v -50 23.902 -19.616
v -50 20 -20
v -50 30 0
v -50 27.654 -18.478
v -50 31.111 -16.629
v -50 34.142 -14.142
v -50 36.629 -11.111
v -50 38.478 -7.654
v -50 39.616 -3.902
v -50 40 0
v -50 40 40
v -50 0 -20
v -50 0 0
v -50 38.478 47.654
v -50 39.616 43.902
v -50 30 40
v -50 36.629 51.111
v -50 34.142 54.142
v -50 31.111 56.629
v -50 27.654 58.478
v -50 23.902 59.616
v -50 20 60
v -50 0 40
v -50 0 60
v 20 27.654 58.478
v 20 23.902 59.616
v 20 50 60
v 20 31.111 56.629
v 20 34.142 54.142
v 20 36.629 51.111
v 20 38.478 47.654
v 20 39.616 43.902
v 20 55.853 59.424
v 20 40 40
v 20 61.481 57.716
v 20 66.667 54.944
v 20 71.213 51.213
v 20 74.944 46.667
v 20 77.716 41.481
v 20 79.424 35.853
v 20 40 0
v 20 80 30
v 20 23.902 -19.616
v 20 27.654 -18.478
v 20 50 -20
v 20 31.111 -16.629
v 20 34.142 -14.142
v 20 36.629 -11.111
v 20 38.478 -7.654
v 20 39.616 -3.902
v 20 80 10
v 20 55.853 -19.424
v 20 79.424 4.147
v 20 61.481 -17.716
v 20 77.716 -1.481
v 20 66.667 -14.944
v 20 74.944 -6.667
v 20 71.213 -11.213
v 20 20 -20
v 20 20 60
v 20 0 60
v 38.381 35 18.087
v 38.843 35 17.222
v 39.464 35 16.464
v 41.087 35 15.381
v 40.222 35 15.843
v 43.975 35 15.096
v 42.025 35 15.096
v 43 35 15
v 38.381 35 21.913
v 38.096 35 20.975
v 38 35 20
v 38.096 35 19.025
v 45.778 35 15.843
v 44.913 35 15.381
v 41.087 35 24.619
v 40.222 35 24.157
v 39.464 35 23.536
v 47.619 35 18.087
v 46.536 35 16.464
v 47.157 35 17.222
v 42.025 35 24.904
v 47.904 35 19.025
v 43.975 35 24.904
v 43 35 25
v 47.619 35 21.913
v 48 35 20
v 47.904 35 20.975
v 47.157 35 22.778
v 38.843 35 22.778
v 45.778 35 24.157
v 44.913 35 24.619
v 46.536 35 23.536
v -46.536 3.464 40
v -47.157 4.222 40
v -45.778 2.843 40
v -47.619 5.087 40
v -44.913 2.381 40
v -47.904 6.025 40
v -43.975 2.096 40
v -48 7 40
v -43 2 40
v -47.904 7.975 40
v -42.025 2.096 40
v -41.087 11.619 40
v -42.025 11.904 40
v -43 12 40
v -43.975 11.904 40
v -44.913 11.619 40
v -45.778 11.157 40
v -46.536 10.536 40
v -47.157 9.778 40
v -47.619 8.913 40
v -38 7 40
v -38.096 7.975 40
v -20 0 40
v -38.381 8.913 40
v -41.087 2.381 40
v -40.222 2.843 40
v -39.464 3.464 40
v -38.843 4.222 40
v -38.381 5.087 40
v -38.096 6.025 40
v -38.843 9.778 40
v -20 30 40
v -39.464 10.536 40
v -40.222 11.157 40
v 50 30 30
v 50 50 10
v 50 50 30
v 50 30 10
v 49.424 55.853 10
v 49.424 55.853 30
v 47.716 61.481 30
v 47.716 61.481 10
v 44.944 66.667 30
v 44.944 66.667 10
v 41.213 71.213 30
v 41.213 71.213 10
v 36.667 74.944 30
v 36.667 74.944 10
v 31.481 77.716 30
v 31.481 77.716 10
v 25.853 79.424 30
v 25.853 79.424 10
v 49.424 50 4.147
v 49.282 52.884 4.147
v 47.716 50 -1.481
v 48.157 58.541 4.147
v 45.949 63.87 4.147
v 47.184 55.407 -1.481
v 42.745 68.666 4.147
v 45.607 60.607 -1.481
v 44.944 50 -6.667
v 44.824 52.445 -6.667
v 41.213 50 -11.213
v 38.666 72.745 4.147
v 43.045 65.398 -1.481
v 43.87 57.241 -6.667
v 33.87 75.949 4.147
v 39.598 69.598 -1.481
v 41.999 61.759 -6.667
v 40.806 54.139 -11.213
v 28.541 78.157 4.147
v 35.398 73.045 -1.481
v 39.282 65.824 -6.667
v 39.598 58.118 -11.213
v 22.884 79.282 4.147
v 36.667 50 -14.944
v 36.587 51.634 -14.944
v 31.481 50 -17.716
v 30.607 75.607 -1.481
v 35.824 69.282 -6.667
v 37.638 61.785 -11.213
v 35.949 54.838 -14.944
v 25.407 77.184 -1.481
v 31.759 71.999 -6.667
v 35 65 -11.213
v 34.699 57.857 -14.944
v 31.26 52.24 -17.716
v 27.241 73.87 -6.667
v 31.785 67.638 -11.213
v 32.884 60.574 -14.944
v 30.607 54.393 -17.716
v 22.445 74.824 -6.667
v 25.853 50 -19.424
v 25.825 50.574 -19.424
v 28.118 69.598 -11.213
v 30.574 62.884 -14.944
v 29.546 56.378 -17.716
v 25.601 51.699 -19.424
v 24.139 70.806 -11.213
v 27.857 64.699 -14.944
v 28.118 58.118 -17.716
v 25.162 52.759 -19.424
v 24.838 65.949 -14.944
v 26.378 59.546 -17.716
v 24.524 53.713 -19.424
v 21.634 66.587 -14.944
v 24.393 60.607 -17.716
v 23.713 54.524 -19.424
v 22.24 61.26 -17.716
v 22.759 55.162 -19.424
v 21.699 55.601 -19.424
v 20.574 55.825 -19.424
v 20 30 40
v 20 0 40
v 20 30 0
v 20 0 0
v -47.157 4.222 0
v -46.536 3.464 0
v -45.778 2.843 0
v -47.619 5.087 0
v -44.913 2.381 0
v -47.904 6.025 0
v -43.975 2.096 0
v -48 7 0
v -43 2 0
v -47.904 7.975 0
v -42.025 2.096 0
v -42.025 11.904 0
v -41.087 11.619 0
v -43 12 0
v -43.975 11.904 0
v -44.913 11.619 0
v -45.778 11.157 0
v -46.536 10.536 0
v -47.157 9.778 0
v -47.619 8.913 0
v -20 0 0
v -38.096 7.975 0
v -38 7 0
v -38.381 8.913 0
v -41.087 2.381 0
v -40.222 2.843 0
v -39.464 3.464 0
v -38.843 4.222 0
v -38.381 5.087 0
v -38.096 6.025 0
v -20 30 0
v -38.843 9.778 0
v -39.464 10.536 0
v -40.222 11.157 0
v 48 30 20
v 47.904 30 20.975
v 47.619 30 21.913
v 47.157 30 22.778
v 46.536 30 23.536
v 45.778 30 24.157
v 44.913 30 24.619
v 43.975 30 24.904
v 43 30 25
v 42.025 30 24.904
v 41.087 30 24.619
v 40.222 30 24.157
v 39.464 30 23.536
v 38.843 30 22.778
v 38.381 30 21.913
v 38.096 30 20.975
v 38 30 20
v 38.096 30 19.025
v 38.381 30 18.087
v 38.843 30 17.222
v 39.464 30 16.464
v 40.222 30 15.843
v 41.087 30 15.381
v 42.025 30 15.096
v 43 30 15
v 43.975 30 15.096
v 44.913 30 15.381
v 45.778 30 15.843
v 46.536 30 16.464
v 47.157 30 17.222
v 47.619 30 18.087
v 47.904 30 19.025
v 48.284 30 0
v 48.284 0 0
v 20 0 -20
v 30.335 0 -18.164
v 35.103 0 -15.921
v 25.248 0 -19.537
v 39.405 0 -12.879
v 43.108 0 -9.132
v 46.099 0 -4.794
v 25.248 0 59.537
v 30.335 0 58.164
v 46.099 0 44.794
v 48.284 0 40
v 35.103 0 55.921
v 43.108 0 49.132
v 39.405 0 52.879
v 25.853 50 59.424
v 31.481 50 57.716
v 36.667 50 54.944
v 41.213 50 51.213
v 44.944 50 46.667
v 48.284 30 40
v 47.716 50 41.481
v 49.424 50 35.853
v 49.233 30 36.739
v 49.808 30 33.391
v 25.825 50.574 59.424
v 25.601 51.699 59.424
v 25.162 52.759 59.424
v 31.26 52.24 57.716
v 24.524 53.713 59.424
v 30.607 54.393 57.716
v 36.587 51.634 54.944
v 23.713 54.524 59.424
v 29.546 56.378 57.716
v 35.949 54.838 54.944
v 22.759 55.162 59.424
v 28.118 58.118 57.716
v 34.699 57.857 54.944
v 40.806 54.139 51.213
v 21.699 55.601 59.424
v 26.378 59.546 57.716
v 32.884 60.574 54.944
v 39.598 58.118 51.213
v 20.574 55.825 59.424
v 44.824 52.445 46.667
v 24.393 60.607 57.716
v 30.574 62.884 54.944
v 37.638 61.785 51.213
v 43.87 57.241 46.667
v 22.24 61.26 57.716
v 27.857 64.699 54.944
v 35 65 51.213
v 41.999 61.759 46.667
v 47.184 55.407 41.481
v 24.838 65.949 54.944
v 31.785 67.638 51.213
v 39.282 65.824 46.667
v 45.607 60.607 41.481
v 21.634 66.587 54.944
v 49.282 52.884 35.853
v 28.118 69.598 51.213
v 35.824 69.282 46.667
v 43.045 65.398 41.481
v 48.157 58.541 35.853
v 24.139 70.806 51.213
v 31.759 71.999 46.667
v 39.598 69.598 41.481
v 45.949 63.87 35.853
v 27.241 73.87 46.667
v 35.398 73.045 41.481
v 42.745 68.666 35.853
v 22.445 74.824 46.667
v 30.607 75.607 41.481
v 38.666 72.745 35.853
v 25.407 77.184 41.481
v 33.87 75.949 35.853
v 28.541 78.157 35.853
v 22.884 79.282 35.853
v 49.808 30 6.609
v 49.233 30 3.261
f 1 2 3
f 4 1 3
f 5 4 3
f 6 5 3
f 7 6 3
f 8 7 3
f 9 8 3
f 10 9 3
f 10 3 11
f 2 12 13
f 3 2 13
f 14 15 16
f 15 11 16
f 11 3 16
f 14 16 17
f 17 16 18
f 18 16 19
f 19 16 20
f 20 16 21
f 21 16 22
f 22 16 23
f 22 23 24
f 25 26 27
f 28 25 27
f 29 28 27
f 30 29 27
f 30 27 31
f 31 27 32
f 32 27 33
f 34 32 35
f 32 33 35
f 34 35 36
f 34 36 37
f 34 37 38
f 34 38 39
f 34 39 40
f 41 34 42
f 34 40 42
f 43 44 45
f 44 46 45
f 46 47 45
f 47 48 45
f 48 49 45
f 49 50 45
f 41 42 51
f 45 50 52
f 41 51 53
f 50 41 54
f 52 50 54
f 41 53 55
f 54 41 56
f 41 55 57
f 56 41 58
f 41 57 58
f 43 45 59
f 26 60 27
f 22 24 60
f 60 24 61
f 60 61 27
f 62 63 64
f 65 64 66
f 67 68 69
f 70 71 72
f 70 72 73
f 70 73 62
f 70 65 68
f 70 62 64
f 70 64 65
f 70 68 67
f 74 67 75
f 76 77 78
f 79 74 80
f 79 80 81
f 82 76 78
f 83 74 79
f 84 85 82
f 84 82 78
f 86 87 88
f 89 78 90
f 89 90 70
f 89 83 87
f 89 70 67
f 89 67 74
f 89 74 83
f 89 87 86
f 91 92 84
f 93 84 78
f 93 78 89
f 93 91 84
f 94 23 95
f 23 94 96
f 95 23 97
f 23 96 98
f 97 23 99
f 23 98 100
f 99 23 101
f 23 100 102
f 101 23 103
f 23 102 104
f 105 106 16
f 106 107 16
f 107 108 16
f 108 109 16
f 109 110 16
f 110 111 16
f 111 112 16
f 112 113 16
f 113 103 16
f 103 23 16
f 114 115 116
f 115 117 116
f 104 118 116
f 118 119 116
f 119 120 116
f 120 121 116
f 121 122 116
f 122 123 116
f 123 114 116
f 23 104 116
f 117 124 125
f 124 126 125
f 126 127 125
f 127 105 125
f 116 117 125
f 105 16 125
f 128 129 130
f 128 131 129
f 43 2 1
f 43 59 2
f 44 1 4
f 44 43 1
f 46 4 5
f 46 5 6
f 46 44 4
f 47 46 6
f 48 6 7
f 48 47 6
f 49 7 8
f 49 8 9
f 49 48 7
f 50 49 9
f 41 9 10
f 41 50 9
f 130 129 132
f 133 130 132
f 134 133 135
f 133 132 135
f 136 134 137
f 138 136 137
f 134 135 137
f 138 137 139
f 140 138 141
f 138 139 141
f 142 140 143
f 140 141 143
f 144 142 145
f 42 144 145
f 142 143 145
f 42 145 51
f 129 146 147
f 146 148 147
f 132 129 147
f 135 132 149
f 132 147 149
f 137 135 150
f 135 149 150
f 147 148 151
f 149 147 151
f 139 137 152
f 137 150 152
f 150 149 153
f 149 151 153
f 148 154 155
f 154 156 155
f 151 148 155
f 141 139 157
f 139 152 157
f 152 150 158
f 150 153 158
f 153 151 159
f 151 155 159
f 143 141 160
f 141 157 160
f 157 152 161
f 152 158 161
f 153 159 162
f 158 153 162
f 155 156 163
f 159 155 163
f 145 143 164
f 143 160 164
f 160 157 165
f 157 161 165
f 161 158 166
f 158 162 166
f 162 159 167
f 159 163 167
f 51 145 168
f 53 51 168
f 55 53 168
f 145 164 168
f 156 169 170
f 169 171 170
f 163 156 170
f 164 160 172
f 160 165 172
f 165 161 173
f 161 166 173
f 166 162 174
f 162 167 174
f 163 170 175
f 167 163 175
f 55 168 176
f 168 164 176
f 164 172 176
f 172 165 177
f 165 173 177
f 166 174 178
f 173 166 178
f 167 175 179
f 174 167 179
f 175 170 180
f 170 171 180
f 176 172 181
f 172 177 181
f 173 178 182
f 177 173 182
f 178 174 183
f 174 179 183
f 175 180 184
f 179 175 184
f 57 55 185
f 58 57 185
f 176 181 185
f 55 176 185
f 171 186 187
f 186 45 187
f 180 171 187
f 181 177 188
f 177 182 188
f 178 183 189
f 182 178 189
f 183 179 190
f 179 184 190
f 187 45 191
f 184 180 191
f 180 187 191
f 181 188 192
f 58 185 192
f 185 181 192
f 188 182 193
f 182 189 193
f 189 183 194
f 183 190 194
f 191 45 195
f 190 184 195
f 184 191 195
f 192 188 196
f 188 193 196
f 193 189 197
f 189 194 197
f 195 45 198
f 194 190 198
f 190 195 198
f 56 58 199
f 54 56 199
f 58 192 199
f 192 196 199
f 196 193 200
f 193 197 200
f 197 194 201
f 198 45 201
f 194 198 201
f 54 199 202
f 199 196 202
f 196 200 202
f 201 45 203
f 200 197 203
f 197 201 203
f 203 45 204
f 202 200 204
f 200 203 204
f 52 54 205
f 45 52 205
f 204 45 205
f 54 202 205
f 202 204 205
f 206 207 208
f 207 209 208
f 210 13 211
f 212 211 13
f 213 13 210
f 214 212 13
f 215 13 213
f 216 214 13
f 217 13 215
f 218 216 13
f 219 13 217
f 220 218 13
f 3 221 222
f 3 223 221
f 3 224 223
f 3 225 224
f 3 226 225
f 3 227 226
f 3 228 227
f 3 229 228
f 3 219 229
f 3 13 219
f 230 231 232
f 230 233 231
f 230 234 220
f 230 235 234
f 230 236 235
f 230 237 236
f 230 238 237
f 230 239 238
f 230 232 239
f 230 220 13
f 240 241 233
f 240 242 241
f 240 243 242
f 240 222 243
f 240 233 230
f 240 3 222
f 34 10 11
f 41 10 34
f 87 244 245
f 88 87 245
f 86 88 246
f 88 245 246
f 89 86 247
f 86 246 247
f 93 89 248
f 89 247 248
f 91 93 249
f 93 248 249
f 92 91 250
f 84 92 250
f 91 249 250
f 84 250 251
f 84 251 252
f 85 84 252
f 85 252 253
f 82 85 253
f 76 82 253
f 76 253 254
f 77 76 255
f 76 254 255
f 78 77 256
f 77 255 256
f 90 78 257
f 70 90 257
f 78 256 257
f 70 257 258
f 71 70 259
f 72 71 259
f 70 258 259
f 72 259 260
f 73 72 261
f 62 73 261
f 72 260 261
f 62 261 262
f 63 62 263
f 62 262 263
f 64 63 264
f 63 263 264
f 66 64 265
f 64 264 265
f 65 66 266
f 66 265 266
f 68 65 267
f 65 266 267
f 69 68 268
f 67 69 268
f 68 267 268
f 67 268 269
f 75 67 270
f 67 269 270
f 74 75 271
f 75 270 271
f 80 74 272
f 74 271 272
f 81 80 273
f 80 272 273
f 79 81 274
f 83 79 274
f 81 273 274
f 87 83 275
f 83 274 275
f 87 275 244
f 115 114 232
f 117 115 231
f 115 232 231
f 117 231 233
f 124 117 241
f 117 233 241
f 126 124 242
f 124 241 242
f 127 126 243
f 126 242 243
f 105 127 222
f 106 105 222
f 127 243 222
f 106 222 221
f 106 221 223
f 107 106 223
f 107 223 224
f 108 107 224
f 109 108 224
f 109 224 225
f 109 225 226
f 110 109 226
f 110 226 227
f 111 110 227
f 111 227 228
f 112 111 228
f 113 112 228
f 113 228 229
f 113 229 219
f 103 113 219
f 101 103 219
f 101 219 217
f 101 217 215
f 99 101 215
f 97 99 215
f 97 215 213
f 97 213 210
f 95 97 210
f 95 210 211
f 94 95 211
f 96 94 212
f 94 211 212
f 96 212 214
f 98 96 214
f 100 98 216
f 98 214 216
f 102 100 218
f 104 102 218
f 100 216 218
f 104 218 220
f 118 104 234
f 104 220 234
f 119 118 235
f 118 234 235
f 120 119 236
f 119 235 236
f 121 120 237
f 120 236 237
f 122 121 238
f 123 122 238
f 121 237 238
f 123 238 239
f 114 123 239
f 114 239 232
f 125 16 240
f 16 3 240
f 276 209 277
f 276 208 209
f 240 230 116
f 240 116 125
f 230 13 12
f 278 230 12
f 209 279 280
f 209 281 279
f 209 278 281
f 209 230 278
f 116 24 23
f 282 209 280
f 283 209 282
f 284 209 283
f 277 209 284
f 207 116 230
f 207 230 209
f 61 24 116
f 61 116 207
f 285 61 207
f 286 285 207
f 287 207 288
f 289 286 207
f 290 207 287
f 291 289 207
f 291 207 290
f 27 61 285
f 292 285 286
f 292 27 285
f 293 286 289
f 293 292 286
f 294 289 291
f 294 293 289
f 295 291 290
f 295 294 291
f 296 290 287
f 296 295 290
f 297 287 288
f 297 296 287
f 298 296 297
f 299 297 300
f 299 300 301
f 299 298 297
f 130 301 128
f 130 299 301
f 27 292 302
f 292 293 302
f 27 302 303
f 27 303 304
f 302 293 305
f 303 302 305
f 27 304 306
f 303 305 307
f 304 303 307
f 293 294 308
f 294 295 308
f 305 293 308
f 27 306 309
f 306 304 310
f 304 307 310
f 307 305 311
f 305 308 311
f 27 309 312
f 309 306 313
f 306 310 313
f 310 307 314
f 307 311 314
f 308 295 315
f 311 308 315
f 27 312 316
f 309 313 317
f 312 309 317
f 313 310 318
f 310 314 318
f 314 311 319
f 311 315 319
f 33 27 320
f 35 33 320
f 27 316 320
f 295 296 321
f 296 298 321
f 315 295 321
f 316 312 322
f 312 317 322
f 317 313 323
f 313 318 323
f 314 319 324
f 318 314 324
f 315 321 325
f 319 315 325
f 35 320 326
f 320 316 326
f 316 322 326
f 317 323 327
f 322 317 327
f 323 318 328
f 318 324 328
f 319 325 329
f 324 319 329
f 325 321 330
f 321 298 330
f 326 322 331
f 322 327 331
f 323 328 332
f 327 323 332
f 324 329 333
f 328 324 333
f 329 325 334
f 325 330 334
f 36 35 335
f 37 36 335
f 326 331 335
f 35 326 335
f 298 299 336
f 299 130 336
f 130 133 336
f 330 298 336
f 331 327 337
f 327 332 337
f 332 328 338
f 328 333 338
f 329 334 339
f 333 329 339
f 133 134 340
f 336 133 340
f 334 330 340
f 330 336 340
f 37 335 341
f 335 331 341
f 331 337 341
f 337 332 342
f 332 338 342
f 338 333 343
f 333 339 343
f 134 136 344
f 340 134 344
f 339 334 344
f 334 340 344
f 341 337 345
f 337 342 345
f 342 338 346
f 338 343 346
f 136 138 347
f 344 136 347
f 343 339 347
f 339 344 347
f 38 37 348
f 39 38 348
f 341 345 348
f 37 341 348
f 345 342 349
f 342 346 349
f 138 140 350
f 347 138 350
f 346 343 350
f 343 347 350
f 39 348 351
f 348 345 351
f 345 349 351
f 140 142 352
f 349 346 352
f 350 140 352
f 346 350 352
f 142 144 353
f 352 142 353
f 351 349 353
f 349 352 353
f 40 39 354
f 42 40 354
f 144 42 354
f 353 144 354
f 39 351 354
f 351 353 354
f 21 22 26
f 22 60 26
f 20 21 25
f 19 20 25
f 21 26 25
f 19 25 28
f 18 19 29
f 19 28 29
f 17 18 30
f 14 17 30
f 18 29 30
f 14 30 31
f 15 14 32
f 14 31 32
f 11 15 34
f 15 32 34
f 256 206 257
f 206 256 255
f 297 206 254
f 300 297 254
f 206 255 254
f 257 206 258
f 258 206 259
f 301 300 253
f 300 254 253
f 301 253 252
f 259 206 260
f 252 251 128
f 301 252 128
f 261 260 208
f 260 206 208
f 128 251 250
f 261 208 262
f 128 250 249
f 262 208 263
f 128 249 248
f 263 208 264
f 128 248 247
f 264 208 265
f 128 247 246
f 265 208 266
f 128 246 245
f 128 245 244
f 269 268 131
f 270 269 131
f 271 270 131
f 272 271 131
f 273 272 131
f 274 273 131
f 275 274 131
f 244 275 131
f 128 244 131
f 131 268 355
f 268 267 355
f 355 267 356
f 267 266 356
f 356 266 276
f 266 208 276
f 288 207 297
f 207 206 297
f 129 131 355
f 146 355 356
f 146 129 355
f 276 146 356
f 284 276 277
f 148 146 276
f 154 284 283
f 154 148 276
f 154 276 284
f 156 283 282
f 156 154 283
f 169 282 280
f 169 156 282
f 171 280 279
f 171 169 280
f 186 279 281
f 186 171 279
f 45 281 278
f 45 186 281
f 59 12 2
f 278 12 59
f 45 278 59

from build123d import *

# Parameters (mm, degrees)
SKETCH_1_W          = 100
SKETCH_1_H          = 40
EXTRUDE_1_DEPTH     = 80
SKETCH_3_W          = 30
SKETCH_3_H          = 30
CUT_EXTRUDE_2_DEPTH = 20
SKETCH_6_R          = 5
EXTRUDE_2_DEPTH     = 20
SKETCH_7_W          = 70
SKETCH_7_H          = 80
CUT_EXTRUDE_3_DEPTH = 40
FILLET_1_R          = 30
FILLET_2_R          = 30
FILLET_3_R          = 30
FILLET_4_R          = 20
FILLET_5_R          = 20
SKETCH1_R           = 5
CUT_EXTRUDE1_DEPTH  = 5


with BuildPart() as part:
    # 草圖1 → 填料-伸長1 (new body)
    with BuildSketch(Plane(origin=(0, 0, 0), x_dir=(1, 0, 0), z_dir=(0, 1, 0))):
        Rectangle(SKETCH_1_W, SKETCH_1_H)
    extrude_1 = extrude(amount=EXTRUDE_1_DEPTH)

    # 草圖3 → 除料-伸長2 (cut)
    with BuildSketch(Plane.XY.offset(20)):
        with Locations((-35, 15)):
            Rectangle(SKETCH_3_W, SKETCH_3_H)
        with Locations((35, 15)):
            Rectangle(SKETCH_3_W, SKETCH_3_H)
    cut_extrude_2 = extrude(amount=-CUT_EXTRUDE_2_DEPTH, mode=Mode.SUBTRACT)

    # 草圖6 → 填料-伸長2 (add)
    with BuildSketch(Plane.XY):
        with Locations((-43, 7)):
            Circle(SKETCH_6_R)
    extrude_2 = extrude(amount=EXTRUDE_2_DEPTH)

    # 鏡射3: 填料-伸長1, 除料-伸長2, 填料-伸長2 across plane
    add(extrude_1.mirror(Plane(origin=(-50, 80, 20), x_dir=(1, 0, 0), z_dir=(0, 0, -1))))
    add(cut_extrude_2.mirror(Plane(origin=(-50, 80, 20), x_dir=(1, 0, 0), z_dir=(0, 0, -1))), mode=Mode.SUBTRACT)
    add(extrude_2.mirror(Plane(origin=(-50, 80, 20), x_dir=(1, 0, 0), z_dir=(0, 0, -1))))

    # 草圖7 → 除料-伸長3 (cut)
    with BuildSketch(Plane(origin=(0, 80, 0), x_dir=(1, 0, 0), z_dir=(0, 1, 0))):
        with Locations((-15, -20)):
            Rectangle(SKETCH_7_W, SKETCH_7_H)
    extrude(amount=-CUT_EXTRUDE_3_DEPTH, mode=Mode.SUBTRACT)

    # 圓角1
    fillet_1_edges = [part.edges().sort_by_distance(p)[0] for p in [
        (50, 80, 20),
    ]]
    fillet(fillet_1_edges, radius=FILLET_1_R - 0.0001)  # a hair under: the kernel refuses the full size

    # 圓角2
    fillet_2_edges = [part.edges().sort_by_distance(p)[0] for p in [
        (50, 25.00005, 60),
        (41.213232725, 71.213232725, 60),
    ]]
    fillet(fillet_2_edges, radius=FILLET_2_R - 0.0001)  # a hair under: the kernel refuses the full size

    # 圓角3
    fillet_3_edges = [part.edges().sort_by_distance(p)[0] for p in [
        (50, 25.00005, -20),
        (41.213232725, 71.213232725, -20),
    ]]
    fillet(fillet_3_edges, radius=FILLET_3_R - 0.0001)  # a hair under: the kernel refuses the full size

    # 圓角4
    fillet_4_edges = [part.edges().sort_by_distance(p)[0] for p in [
        (-15, 40, 60),
    ]]
    fillet(fillet_4_edges, radius=FILLET_4_R)

    # 圓角5
    fillet_5_edges = [part.edges().sort_by_distance(p)[0] for p in [
        (-15, 40, -20),
    ]]
    fillet(fillet_5_edges, radius=FILLET_5_R)

    # Sketch1 → Cut-Extrude1 (cut)
    with BuildSketch(Plane.XZ.offset(-30)):
        with Locations((43, 20)):
            Circle(SKETCH1_R)
    extrude(amount=-CUT_EXTRUDE1_DEPTH, mode=Mode.SUBTRACT)


solid = part.part
